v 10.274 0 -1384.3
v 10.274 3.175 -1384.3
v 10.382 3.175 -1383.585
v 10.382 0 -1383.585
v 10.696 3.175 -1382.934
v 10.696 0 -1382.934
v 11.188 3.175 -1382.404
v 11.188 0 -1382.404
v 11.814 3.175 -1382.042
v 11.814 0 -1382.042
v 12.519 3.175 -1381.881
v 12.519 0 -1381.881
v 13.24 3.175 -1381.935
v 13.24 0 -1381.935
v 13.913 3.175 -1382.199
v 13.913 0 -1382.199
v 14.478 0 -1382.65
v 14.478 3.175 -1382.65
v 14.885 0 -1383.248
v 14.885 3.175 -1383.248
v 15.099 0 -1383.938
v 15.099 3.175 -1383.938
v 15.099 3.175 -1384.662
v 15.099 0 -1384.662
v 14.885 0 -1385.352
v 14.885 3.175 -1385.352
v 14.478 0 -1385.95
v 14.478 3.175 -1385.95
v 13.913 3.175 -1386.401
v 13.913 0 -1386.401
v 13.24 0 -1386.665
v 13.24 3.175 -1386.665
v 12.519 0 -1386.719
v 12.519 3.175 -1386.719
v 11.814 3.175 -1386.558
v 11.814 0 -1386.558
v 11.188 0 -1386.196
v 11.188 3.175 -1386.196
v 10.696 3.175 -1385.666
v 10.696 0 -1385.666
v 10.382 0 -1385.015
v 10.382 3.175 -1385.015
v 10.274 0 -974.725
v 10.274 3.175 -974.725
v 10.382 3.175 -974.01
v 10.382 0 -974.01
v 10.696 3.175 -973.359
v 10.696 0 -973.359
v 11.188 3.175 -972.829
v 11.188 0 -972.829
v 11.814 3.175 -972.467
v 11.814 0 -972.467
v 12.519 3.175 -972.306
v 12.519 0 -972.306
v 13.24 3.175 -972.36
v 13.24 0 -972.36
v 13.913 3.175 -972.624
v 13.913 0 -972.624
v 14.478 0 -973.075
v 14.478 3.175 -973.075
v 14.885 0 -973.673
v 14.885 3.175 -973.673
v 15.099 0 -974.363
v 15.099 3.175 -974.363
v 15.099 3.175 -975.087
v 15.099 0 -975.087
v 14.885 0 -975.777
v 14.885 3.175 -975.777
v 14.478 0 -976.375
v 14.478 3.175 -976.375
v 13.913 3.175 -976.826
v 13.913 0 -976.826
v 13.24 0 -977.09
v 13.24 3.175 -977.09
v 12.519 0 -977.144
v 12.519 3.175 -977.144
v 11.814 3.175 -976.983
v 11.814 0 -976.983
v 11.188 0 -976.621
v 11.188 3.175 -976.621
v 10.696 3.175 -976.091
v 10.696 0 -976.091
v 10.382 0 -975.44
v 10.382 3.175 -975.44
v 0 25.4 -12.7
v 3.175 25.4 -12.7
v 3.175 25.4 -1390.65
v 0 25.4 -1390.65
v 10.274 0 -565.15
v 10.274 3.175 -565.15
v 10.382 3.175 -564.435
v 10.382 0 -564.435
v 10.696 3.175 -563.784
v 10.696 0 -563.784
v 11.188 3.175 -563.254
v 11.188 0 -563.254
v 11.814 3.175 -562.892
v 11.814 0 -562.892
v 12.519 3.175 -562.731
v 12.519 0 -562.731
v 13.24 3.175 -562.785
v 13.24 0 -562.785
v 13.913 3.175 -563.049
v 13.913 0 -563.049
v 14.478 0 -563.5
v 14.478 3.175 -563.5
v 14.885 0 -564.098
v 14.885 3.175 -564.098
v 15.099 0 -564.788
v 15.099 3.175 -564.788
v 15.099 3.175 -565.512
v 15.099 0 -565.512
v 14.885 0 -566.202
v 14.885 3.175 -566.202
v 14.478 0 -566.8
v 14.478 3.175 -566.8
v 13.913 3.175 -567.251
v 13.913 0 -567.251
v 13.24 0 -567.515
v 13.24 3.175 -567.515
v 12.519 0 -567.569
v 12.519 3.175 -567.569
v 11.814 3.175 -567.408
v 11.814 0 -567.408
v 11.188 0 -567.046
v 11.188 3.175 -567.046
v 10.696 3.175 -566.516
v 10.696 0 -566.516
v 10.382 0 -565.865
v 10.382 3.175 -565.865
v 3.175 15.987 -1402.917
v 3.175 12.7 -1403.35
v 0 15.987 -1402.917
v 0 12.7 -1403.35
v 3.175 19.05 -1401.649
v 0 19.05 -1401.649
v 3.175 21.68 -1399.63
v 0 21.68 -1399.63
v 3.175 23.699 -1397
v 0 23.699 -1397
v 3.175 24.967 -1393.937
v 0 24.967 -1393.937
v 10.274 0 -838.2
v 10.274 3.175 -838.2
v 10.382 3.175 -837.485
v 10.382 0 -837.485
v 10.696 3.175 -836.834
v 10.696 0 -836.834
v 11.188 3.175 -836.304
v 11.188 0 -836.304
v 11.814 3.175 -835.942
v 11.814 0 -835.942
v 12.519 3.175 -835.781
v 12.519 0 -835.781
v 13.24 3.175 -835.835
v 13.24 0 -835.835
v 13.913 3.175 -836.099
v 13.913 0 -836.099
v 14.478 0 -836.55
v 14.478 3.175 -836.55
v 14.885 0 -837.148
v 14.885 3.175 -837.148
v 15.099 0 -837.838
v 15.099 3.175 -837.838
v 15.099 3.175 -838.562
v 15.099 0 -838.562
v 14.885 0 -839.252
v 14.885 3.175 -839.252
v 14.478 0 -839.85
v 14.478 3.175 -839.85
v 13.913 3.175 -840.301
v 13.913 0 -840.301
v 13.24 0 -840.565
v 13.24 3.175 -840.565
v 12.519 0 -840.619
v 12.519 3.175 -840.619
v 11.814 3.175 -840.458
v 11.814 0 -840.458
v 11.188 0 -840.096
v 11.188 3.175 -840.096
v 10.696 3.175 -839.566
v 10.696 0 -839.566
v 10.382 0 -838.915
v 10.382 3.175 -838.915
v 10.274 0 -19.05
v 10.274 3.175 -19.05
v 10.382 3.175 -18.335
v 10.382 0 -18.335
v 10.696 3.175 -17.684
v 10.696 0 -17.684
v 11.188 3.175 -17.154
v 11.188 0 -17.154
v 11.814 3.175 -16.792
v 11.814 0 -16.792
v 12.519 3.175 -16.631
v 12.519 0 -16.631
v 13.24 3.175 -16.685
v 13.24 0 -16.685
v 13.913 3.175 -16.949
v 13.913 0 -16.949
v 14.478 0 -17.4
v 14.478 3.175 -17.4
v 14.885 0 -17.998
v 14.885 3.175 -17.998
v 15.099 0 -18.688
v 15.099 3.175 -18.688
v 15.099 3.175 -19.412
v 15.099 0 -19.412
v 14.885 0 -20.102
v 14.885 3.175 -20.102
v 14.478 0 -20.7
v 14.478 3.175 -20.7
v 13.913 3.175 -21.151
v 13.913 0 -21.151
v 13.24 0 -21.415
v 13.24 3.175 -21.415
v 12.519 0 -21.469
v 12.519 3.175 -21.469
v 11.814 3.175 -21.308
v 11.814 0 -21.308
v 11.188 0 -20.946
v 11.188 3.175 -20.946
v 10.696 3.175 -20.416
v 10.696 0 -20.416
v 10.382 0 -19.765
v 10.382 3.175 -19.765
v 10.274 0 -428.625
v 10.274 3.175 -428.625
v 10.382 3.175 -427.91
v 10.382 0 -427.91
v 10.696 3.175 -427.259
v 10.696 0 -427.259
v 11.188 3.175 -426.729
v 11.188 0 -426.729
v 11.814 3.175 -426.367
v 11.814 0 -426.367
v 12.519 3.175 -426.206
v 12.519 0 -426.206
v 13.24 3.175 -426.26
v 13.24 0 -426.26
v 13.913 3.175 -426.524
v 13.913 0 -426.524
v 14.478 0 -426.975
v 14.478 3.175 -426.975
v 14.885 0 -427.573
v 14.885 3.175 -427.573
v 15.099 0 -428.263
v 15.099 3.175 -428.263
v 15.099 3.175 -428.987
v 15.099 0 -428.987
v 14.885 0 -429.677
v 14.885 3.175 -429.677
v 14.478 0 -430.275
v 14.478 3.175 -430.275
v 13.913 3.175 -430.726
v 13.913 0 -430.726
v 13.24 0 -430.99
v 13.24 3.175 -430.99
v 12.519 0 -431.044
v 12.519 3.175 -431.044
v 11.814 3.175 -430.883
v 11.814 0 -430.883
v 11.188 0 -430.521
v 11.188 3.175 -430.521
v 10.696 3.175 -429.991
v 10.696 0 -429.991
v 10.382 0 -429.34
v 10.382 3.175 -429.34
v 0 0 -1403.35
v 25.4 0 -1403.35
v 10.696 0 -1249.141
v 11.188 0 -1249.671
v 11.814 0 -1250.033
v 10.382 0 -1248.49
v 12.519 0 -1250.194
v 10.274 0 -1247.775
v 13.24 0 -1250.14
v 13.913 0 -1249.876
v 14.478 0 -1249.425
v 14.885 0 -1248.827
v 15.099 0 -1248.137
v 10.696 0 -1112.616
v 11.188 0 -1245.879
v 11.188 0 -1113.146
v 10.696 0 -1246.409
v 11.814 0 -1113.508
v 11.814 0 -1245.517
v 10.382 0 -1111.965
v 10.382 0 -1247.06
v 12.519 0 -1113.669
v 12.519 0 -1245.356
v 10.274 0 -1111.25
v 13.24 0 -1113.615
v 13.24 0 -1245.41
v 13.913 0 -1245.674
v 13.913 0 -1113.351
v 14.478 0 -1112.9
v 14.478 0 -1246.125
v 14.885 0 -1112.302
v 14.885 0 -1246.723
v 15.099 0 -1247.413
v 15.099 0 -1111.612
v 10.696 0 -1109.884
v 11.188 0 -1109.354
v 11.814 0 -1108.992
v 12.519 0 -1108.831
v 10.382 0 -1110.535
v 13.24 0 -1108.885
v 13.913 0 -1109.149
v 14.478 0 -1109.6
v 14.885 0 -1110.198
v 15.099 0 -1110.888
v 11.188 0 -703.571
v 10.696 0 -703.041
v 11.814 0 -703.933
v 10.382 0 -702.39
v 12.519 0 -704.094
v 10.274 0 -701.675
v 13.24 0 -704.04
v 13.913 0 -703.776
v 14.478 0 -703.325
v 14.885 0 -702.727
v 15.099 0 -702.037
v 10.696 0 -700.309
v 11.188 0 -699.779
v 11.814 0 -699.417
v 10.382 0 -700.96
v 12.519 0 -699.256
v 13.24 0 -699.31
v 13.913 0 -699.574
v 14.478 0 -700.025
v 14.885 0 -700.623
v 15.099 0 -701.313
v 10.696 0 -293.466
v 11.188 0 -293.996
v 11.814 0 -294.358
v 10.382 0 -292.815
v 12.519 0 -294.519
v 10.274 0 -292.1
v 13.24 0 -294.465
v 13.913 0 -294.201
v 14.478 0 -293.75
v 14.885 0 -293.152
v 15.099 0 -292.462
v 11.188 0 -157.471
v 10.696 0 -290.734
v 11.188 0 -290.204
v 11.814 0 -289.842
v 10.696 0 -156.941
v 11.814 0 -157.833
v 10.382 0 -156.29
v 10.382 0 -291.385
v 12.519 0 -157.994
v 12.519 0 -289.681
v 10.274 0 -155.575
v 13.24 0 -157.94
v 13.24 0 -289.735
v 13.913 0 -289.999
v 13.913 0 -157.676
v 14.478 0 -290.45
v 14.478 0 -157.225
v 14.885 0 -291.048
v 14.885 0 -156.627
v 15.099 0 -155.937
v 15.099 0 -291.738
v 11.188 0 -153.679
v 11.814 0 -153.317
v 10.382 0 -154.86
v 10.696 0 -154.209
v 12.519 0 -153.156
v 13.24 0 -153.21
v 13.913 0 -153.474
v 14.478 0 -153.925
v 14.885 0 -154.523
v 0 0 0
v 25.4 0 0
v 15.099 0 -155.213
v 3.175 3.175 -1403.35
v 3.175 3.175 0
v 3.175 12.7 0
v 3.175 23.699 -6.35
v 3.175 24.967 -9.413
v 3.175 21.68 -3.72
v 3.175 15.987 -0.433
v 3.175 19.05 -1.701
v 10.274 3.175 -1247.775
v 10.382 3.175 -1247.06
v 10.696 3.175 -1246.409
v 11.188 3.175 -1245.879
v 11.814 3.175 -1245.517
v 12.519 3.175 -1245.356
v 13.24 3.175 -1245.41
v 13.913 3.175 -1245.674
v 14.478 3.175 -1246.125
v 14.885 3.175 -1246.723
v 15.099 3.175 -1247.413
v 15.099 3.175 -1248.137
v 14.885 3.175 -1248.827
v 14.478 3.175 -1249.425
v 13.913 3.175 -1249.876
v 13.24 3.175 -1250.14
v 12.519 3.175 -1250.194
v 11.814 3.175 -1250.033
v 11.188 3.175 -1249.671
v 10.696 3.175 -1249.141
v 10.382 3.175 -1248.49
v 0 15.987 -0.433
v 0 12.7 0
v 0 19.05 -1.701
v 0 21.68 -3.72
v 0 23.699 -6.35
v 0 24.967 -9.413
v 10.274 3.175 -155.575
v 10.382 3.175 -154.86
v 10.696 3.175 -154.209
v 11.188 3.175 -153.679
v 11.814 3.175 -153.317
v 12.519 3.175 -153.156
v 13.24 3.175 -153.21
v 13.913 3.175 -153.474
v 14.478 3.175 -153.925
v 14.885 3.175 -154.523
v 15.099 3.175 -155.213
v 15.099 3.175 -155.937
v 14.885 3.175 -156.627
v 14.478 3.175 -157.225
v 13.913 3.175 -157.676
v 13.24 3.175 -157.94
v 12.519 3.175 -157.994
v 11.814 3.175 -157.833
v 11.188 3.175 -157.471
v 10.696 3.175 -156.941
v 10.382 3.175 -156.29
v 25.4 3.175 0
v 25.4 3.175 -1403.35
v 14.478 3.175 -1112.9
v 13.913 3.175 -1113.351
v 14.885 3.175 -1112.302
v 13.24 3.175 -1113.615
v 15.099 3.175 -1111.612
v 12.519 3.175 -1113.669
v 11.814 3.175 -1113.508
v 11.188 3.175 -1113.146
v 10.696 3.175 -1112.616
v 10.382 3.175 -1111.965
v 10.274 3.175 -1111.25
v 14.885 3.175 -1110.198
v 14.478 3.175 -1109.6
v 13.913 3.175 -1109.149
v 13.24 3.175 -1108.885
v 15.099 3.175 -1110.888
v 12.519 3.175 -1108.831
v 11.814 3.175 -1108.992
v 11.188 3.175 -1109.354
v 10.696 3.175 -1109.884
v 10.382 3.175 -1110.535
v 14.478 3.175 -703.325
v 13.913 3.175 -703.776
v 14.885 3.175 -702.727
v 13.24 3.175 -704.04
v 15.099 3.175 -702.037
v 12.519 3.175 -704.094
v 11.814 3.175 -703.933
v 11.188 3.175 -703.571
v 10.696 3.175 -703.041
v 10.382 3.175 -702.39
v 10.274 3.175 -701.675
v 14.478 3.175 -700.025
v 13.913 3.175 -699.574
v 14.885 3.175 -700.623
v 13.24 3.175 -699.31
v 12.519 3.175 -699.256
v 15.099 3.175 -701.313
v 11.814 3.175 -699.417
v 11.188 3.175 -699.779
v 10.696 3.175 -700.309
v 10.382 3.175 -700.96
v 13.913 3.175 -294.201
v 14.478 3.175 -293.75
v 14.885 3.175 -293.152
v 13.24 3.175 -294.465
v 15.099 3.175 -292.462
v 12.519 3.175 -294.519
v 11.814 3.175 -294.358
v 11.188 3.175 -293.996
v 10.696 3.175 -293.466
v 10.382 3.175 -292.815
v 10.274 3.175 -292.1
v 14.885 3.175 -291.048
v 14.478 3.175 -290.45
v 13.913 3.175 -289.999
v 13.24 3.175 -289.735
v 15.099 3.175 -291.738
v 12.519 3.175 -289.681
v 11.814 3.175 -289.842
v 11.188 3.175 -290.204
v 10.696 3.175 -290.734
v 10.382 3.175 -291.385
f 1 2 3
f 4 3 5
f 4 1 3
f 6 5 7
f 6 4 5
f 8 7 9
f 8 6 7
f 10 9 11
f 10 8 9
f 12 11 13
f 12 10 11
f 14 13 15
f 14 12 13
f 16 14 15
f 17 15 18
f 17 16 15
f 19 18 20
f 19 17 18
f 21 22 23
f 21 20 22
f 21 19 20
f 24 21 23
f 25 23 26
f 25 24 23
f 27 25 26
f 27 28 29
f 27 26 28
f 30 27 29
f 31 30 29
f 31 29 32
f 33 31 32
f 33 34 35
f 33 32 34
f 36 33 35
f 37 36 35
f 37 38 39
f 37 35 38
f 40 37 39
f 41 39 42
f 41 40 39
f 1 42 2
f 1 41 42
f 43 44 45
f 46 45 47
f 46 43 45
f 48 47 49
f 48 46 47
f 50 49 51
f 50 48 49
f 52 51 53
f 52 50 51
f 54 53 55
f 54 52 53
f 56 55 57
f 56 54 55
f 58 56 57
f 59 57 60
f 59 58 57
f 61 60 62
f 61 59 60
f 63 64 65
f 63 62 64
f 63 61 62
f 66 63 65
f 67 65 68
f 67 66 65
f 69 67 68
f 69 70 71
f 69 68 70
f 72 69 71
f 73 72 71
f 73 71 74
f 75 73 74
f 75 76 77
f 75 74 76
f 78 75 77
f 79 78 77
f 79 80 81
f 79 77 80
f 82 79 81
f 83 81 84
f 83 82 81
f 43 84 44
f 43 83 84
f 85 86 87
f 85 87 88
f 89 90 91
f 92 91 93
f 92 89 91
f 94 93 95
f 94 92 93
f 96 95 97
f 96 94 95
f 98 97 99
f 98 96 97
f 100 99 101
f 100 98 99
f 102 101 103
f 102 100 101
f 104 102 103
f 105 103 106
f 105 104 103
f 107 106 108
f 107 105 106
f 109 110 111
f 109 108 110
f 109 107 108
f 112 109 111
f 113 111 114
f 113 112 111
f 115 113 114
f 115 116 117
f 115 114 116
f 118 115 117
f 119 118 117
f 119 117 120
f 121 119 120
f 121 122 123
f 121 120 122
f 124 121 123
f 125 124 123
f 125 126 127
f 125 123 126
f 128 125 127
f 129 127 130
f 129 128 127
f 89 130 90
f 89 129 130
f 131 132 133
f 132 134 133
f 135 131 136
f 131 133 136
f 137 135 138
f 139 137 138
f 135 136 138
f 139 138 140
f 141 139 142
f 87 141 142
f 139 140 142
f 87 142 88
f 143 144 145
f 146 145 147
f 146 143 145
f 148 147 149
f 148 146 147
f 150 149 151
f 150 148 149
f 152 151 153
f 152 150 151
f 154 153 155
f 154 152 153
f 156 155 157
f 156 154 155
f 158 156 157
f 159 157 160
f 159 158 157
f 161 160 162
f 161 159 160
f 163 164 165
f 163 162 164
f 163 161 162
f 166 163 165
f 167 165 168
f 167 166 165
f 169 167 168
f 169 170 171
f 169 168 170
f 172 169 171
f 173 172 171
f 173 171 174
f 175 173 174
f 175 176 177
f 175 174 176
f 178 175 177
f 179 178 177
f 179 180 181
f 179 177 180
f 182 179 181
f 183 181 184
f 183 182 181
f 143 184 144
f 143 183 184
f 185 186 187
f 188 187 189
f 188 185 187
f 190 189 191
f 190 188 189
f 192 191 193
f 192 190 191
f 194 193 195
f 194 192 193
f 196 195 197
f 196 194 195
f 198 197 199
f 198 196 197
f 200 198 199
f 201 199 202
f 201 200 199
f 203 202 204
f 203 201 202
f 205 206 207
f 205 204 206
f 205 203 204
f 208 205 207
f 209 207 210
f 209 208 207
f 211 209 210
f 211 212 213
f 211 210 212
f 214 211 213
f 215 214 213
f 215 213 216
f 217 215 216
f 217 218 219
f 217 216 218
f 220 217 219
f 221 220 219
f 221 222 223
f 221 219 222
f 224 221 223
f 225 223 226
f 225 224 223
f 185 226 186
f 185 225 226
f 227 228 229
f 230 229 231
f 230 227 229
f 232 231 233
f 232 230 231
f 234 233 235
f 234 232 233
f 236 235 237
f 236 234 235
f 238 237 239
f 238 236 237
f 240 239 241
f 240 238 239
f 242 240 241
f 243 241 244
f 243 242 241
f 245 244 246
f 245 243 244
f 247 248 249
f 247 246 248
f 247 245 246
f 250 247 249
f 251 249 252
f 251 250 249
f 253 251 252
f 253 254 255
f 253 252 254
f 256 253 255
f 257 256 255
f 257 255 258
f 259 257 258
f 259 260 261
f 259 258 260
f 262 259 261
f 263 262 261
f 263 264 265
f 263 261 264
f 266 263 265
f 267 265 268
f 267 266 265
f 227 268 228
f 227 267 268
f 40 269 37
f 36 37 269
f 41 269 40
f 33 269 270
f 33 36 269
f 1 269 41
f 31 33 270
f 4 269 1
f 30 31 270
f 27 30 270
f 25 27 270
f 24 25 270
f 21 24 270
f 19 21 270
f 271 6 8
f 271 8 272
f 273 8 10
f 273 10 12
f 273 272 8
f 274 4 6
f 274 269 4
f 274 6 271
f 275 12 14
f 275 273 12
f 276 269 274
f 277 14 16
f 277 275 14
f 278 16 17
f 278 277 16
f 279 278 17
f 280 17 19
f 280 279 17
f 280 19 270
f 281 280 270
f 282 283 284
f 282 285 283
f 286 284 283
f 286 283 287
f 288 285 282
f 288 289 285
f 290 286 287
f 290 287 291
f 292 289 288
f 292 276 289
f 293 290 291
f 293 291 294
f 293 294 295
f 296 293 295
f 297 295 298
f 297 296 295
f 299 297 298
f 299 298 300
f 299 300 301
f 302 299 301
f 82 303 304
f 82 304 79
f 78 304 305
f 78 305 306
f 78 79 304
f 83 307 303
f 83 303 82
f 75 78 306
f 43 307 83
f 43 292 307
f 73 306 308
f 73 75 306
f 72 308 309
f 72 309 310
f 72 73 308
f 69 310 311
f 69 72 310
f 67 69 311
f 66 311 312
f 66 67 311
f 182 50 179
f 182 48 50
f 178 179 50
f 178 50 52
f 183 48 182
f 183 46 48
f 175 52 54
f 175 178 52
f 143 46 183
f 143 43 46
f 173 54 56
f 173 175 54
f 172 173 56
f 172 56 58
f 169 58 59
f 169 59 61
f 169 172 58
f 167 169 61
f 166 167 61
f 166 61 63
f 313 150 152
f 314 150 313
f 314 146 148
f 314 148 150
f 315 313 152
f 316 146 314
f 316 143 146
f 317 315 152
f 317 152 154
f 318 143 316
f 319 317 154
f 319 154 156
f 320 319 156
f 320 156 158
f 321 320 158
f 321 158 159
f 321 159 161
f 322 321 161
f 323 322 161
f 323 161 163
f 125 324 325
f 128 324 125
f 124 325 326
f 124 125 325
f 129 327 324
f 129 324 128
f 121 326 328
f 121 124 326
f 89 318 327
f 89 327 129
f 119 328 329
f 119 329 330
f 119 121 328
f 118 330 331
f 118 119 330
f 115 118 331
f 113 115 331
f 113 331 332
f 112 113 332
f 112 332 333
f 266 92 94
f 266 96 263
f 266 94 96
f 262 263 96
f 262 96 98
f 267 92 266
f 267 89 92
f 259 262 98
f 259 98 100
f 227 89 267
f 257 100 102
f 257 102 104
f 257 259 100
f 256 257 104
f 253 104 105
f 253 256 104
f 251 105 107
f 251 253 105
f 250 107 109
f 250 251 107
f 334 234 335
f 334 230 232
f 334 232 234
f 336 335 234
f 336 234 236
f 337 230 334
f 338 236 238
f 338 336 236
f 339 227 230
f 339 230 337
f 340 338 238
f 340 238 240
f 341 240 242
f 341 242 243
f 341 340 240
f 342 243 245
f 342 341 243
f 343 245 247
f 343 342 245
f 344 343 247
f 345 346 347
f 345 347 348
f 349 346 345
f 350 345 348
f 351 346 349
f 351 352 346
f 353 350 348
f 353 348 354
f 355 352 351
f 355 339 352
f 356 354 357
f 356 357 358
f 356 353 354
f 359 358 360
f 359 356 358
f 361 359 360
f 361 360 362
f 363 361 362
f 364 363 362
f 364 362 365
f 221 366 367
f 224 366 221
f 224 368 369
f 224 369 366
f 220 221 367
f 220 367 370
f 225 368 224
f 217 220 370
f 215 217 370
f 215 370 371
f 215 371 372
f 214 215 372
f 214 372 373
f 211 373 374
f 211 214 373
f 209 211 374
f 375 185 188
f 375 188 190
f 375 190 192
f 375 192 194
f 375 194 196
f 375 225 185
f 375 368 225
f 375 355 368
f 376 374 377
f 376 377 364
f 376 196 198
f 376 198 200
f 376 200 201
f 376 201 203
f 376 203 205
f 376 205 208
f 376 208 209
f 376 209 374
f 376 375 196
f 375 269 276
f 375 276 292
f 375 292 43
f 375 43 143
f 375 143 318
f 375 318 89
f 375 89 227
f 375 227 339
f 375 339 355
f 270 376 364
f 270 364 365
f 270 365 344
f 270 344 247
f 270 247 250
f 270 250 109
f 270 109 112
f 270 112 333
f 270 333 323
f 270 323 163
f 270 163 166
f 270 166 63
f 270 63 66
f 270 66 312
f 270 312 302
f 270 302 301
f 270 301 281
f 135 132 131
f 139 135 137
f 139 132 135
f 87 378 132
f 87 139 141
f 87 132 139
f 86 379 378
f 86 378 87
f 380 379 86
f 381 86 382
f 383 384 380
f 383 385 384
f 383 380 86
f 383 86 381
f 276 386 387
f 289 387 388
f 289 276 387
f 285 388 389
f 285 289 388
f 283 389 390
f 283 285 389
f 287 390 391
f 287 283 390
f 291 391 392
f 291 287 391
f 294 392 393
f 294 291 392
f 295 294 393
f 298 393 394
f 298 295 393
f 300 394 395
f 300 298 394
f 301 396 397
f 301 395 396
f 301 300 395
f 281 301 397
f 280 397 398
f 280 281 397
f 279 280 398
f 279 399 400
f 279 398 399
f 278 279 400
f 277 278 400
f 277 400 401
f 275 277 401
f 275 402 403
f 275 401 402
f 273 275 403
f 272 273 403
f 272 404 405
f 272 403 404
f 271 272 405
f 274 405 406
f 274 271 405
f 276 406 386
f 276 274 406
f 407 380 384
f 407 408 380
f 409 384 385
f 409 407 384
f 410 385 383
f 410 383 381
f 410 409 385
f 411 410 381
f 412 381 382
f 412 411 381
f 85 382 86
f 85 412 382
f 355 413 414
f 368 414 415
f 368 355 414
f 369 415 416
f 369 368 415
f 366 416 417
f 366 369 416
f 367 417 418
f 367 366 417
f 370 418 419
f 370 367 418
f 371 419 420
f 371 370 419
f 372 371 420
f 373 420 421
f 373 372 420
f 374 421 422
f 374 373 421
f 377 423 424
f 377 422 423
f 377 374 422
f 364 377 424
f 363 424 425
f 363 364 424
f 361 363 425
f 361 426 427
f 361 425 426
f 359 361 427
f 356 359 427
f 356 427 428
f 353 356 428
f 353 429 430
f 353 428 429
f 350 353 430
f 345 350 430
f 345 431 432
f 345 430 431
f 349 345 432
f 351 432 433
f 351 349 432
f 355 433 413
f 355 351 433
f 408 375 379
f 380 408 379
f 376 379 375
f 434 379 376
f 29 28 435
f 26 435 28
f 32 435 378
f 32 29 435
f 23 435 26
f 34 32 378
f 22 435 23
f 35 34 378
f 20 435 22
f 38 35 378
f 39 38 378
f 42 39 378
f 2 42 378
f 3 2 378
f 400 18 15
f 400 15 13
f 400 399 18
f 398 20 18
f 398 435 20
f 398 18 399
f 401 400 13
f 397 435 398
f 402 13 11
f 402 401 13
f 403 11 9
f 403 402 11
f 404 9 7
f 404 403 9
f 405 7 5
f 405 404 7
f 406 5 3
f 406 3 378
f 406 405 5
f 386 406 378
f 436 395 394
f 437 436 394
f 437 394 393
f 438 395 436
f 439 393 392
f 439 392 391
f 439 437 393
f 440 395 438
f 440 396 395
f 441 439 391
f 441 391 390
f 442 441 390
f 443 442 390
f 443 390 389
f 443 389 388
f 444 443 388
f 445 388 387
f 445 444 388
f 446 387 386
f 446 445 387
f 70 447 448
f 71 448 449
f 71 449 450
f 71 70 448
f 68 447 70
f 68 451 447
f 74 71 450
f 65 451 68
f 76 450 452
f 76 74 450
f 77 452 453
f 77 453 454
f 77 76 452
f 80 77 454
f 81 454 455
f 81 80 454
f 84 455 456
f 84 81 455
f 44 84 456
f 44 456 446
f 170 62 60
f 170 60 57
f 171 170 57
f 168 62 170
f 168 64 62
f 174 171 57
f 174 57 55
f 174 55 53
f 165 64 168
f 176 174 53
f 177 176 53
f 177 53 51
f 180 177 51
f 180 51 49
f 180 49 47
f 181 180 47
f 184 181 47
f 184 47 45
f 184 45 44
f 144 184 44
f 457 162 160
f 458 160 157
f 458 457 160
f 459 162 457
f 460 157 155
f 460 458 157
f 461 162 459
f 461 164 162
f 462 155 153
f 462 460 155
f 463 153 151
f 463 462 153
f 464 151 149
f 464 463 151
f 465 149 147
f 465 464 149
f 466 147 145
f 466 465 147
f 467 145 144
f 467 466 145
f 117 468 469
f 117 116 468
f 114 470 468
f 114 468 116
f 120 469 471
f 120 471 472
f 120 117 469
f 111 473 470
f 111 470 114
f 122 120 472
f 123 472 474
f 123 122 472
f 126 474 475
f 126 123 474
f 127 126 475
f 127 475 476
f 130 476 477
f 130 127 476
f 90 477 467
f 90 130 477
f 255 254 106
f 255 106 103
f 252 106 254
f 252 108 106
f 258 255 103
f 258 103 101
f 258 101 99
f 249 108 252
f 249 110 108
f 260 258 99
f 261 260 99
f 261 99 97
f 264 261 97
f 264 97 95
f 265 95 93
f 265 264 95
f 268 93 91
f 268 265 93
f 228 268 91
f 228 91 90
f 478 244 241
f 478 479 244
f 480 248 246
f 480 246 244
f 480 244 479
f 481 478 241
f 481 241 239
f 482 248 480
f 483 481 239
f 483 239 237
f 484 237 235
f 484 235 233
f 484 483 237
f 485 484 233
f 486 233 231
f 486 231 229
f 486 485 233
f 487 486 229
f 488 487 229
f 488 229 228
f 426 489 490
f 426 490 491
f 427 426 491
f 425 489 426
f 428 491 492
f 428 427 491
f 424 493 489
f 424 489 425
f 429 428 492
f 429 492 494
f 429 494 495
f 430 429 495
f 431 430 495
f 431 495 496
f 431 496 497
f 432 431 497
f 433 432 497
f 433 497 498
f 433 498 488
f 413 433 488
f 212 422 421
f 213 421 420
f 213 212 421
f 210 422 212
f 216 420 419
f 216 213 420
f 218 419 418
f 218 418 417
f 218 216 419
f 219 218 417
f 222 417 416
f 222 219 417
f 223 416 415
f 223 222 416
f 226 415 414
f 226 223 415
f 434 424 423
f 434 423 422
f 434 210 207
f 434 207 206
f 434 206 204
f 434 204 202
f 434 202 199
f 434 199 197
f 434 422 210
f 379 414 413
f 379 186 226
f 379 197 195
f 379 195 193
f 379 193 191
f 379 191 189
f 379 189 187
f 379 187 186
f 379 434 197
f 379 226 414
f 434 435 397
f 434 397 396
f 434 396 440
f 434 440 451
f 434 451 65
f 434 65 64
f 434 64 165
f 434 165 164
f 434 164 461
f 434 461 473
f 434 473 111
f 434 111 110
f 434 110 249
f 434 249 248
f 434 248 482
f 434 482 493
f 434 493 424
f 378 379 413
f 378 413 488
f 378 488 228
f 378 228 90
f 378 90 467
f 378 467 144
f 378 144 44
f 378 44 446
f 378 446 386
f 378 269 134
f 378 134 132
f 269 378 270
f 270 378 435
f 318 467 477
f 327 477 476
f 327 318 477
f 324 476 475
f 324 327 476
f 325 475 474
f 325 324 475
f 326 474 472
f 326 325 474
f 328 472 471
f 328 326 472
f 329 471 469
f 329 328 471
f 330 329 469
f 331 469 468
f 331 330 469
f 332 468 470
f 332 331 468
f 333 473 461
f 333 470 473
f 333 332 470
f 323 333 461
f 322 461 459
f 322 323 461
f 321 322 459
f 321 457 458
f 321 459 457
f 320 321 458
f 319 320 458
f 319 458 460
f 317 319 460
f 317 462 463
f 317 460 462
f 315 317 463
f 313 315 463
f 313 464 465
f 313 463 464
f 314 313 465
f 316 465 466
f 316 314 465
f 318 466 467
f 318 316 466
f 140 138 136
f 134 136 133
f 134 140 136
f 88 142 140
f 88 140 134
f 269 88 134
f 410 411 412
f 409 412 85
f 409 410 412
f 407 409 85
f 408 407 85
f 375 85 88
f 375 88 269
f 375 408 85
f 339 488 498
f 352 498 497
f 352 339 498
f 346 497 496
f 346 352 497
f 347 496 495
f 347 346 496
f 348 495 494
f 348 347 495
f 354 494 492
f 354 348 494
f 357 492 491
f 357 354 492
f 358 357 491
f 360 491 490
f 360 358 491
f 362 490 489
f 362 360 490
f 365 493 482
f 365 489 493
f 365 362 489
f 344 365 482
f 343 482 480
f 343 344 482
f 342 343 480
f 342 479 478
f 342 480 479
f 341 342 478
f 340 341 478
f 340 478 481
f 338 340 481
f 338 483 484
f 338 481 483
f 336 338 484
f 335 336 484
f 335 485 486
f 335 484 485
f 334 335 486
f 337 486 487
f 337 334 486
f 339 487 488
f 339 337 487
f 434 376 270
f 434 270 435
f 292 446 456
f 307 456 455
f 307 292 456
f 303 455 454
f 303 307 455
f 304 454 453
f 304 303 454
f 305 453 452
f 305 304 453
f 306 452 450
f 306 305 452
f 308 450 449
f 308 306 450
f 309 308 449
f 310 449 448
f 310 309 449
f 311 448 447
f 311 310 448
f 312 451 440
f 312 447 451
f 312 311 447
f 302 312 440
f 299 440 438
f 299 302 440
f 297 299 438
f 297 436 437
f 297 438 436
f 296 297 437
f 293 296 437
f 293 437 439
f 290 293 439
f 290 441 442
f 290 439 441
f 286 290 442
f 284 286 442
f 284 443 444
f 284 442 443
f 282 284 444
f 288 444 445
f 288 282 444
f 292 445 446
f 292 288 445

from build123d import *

# Parameters (mm, degrees)
EXTRUDE1_DEPTH     = 1403.35
SKETCH2_R          = 2.4257
CUT_EXTRUDE2_DEPTH = 1404.809653229
LPATTERN1_COUNT    = 11
LPATTERN1_PITCH    = 136.525
FILLET1_R          = 12.7


with BuildPart() as part:
    # Sketch1 → Extrude1 (new body)
    with BuildSketch(Plane.XY):
        Polygon((0, 0), (25.4, 0), (25.4, 3.175), (3.175, 3.175), (3.175, 25.4), (0, 25.4), align=None)
    extrude(amount=-EXTRUDE1_DEPTH)

    # Sketch2 → Cut-Extrude2 (cut, through all)
    with BuildSketch(Plane(origin=(0, 0, 0), x_dir=(1, 0, 0), z_dir=(0, 1, 0))):
        with Locations(Location((12.7, 19.05, 0), (0, 0, 180))):
            Circle(SKETCH2_R)
    cut_extrude2 = extrude(amount=CUT_EXTRUDE2_DEPTH, mode=Mode.SUBTRACT)

    # LPattern1: Cut-Extrude2 ×11
    with Locations(*[(0, 0, -i * LPATTERN1_PITCH) for i in range(1, LPATTERN1_COUNT)]):
        add(cut_extrude2, mode=Mode.SUBTRACT)

    # Fillet1
    fillet1_edges = [part.edges().sort_by_distance(p)[0] for p in [
        (1.5875, 25.4, -1403.35),
        (1.5875, 25.4, 0),
    ]]
    fillet(fillet1_edges, radius=FILLET1_R)


solid = part.part
